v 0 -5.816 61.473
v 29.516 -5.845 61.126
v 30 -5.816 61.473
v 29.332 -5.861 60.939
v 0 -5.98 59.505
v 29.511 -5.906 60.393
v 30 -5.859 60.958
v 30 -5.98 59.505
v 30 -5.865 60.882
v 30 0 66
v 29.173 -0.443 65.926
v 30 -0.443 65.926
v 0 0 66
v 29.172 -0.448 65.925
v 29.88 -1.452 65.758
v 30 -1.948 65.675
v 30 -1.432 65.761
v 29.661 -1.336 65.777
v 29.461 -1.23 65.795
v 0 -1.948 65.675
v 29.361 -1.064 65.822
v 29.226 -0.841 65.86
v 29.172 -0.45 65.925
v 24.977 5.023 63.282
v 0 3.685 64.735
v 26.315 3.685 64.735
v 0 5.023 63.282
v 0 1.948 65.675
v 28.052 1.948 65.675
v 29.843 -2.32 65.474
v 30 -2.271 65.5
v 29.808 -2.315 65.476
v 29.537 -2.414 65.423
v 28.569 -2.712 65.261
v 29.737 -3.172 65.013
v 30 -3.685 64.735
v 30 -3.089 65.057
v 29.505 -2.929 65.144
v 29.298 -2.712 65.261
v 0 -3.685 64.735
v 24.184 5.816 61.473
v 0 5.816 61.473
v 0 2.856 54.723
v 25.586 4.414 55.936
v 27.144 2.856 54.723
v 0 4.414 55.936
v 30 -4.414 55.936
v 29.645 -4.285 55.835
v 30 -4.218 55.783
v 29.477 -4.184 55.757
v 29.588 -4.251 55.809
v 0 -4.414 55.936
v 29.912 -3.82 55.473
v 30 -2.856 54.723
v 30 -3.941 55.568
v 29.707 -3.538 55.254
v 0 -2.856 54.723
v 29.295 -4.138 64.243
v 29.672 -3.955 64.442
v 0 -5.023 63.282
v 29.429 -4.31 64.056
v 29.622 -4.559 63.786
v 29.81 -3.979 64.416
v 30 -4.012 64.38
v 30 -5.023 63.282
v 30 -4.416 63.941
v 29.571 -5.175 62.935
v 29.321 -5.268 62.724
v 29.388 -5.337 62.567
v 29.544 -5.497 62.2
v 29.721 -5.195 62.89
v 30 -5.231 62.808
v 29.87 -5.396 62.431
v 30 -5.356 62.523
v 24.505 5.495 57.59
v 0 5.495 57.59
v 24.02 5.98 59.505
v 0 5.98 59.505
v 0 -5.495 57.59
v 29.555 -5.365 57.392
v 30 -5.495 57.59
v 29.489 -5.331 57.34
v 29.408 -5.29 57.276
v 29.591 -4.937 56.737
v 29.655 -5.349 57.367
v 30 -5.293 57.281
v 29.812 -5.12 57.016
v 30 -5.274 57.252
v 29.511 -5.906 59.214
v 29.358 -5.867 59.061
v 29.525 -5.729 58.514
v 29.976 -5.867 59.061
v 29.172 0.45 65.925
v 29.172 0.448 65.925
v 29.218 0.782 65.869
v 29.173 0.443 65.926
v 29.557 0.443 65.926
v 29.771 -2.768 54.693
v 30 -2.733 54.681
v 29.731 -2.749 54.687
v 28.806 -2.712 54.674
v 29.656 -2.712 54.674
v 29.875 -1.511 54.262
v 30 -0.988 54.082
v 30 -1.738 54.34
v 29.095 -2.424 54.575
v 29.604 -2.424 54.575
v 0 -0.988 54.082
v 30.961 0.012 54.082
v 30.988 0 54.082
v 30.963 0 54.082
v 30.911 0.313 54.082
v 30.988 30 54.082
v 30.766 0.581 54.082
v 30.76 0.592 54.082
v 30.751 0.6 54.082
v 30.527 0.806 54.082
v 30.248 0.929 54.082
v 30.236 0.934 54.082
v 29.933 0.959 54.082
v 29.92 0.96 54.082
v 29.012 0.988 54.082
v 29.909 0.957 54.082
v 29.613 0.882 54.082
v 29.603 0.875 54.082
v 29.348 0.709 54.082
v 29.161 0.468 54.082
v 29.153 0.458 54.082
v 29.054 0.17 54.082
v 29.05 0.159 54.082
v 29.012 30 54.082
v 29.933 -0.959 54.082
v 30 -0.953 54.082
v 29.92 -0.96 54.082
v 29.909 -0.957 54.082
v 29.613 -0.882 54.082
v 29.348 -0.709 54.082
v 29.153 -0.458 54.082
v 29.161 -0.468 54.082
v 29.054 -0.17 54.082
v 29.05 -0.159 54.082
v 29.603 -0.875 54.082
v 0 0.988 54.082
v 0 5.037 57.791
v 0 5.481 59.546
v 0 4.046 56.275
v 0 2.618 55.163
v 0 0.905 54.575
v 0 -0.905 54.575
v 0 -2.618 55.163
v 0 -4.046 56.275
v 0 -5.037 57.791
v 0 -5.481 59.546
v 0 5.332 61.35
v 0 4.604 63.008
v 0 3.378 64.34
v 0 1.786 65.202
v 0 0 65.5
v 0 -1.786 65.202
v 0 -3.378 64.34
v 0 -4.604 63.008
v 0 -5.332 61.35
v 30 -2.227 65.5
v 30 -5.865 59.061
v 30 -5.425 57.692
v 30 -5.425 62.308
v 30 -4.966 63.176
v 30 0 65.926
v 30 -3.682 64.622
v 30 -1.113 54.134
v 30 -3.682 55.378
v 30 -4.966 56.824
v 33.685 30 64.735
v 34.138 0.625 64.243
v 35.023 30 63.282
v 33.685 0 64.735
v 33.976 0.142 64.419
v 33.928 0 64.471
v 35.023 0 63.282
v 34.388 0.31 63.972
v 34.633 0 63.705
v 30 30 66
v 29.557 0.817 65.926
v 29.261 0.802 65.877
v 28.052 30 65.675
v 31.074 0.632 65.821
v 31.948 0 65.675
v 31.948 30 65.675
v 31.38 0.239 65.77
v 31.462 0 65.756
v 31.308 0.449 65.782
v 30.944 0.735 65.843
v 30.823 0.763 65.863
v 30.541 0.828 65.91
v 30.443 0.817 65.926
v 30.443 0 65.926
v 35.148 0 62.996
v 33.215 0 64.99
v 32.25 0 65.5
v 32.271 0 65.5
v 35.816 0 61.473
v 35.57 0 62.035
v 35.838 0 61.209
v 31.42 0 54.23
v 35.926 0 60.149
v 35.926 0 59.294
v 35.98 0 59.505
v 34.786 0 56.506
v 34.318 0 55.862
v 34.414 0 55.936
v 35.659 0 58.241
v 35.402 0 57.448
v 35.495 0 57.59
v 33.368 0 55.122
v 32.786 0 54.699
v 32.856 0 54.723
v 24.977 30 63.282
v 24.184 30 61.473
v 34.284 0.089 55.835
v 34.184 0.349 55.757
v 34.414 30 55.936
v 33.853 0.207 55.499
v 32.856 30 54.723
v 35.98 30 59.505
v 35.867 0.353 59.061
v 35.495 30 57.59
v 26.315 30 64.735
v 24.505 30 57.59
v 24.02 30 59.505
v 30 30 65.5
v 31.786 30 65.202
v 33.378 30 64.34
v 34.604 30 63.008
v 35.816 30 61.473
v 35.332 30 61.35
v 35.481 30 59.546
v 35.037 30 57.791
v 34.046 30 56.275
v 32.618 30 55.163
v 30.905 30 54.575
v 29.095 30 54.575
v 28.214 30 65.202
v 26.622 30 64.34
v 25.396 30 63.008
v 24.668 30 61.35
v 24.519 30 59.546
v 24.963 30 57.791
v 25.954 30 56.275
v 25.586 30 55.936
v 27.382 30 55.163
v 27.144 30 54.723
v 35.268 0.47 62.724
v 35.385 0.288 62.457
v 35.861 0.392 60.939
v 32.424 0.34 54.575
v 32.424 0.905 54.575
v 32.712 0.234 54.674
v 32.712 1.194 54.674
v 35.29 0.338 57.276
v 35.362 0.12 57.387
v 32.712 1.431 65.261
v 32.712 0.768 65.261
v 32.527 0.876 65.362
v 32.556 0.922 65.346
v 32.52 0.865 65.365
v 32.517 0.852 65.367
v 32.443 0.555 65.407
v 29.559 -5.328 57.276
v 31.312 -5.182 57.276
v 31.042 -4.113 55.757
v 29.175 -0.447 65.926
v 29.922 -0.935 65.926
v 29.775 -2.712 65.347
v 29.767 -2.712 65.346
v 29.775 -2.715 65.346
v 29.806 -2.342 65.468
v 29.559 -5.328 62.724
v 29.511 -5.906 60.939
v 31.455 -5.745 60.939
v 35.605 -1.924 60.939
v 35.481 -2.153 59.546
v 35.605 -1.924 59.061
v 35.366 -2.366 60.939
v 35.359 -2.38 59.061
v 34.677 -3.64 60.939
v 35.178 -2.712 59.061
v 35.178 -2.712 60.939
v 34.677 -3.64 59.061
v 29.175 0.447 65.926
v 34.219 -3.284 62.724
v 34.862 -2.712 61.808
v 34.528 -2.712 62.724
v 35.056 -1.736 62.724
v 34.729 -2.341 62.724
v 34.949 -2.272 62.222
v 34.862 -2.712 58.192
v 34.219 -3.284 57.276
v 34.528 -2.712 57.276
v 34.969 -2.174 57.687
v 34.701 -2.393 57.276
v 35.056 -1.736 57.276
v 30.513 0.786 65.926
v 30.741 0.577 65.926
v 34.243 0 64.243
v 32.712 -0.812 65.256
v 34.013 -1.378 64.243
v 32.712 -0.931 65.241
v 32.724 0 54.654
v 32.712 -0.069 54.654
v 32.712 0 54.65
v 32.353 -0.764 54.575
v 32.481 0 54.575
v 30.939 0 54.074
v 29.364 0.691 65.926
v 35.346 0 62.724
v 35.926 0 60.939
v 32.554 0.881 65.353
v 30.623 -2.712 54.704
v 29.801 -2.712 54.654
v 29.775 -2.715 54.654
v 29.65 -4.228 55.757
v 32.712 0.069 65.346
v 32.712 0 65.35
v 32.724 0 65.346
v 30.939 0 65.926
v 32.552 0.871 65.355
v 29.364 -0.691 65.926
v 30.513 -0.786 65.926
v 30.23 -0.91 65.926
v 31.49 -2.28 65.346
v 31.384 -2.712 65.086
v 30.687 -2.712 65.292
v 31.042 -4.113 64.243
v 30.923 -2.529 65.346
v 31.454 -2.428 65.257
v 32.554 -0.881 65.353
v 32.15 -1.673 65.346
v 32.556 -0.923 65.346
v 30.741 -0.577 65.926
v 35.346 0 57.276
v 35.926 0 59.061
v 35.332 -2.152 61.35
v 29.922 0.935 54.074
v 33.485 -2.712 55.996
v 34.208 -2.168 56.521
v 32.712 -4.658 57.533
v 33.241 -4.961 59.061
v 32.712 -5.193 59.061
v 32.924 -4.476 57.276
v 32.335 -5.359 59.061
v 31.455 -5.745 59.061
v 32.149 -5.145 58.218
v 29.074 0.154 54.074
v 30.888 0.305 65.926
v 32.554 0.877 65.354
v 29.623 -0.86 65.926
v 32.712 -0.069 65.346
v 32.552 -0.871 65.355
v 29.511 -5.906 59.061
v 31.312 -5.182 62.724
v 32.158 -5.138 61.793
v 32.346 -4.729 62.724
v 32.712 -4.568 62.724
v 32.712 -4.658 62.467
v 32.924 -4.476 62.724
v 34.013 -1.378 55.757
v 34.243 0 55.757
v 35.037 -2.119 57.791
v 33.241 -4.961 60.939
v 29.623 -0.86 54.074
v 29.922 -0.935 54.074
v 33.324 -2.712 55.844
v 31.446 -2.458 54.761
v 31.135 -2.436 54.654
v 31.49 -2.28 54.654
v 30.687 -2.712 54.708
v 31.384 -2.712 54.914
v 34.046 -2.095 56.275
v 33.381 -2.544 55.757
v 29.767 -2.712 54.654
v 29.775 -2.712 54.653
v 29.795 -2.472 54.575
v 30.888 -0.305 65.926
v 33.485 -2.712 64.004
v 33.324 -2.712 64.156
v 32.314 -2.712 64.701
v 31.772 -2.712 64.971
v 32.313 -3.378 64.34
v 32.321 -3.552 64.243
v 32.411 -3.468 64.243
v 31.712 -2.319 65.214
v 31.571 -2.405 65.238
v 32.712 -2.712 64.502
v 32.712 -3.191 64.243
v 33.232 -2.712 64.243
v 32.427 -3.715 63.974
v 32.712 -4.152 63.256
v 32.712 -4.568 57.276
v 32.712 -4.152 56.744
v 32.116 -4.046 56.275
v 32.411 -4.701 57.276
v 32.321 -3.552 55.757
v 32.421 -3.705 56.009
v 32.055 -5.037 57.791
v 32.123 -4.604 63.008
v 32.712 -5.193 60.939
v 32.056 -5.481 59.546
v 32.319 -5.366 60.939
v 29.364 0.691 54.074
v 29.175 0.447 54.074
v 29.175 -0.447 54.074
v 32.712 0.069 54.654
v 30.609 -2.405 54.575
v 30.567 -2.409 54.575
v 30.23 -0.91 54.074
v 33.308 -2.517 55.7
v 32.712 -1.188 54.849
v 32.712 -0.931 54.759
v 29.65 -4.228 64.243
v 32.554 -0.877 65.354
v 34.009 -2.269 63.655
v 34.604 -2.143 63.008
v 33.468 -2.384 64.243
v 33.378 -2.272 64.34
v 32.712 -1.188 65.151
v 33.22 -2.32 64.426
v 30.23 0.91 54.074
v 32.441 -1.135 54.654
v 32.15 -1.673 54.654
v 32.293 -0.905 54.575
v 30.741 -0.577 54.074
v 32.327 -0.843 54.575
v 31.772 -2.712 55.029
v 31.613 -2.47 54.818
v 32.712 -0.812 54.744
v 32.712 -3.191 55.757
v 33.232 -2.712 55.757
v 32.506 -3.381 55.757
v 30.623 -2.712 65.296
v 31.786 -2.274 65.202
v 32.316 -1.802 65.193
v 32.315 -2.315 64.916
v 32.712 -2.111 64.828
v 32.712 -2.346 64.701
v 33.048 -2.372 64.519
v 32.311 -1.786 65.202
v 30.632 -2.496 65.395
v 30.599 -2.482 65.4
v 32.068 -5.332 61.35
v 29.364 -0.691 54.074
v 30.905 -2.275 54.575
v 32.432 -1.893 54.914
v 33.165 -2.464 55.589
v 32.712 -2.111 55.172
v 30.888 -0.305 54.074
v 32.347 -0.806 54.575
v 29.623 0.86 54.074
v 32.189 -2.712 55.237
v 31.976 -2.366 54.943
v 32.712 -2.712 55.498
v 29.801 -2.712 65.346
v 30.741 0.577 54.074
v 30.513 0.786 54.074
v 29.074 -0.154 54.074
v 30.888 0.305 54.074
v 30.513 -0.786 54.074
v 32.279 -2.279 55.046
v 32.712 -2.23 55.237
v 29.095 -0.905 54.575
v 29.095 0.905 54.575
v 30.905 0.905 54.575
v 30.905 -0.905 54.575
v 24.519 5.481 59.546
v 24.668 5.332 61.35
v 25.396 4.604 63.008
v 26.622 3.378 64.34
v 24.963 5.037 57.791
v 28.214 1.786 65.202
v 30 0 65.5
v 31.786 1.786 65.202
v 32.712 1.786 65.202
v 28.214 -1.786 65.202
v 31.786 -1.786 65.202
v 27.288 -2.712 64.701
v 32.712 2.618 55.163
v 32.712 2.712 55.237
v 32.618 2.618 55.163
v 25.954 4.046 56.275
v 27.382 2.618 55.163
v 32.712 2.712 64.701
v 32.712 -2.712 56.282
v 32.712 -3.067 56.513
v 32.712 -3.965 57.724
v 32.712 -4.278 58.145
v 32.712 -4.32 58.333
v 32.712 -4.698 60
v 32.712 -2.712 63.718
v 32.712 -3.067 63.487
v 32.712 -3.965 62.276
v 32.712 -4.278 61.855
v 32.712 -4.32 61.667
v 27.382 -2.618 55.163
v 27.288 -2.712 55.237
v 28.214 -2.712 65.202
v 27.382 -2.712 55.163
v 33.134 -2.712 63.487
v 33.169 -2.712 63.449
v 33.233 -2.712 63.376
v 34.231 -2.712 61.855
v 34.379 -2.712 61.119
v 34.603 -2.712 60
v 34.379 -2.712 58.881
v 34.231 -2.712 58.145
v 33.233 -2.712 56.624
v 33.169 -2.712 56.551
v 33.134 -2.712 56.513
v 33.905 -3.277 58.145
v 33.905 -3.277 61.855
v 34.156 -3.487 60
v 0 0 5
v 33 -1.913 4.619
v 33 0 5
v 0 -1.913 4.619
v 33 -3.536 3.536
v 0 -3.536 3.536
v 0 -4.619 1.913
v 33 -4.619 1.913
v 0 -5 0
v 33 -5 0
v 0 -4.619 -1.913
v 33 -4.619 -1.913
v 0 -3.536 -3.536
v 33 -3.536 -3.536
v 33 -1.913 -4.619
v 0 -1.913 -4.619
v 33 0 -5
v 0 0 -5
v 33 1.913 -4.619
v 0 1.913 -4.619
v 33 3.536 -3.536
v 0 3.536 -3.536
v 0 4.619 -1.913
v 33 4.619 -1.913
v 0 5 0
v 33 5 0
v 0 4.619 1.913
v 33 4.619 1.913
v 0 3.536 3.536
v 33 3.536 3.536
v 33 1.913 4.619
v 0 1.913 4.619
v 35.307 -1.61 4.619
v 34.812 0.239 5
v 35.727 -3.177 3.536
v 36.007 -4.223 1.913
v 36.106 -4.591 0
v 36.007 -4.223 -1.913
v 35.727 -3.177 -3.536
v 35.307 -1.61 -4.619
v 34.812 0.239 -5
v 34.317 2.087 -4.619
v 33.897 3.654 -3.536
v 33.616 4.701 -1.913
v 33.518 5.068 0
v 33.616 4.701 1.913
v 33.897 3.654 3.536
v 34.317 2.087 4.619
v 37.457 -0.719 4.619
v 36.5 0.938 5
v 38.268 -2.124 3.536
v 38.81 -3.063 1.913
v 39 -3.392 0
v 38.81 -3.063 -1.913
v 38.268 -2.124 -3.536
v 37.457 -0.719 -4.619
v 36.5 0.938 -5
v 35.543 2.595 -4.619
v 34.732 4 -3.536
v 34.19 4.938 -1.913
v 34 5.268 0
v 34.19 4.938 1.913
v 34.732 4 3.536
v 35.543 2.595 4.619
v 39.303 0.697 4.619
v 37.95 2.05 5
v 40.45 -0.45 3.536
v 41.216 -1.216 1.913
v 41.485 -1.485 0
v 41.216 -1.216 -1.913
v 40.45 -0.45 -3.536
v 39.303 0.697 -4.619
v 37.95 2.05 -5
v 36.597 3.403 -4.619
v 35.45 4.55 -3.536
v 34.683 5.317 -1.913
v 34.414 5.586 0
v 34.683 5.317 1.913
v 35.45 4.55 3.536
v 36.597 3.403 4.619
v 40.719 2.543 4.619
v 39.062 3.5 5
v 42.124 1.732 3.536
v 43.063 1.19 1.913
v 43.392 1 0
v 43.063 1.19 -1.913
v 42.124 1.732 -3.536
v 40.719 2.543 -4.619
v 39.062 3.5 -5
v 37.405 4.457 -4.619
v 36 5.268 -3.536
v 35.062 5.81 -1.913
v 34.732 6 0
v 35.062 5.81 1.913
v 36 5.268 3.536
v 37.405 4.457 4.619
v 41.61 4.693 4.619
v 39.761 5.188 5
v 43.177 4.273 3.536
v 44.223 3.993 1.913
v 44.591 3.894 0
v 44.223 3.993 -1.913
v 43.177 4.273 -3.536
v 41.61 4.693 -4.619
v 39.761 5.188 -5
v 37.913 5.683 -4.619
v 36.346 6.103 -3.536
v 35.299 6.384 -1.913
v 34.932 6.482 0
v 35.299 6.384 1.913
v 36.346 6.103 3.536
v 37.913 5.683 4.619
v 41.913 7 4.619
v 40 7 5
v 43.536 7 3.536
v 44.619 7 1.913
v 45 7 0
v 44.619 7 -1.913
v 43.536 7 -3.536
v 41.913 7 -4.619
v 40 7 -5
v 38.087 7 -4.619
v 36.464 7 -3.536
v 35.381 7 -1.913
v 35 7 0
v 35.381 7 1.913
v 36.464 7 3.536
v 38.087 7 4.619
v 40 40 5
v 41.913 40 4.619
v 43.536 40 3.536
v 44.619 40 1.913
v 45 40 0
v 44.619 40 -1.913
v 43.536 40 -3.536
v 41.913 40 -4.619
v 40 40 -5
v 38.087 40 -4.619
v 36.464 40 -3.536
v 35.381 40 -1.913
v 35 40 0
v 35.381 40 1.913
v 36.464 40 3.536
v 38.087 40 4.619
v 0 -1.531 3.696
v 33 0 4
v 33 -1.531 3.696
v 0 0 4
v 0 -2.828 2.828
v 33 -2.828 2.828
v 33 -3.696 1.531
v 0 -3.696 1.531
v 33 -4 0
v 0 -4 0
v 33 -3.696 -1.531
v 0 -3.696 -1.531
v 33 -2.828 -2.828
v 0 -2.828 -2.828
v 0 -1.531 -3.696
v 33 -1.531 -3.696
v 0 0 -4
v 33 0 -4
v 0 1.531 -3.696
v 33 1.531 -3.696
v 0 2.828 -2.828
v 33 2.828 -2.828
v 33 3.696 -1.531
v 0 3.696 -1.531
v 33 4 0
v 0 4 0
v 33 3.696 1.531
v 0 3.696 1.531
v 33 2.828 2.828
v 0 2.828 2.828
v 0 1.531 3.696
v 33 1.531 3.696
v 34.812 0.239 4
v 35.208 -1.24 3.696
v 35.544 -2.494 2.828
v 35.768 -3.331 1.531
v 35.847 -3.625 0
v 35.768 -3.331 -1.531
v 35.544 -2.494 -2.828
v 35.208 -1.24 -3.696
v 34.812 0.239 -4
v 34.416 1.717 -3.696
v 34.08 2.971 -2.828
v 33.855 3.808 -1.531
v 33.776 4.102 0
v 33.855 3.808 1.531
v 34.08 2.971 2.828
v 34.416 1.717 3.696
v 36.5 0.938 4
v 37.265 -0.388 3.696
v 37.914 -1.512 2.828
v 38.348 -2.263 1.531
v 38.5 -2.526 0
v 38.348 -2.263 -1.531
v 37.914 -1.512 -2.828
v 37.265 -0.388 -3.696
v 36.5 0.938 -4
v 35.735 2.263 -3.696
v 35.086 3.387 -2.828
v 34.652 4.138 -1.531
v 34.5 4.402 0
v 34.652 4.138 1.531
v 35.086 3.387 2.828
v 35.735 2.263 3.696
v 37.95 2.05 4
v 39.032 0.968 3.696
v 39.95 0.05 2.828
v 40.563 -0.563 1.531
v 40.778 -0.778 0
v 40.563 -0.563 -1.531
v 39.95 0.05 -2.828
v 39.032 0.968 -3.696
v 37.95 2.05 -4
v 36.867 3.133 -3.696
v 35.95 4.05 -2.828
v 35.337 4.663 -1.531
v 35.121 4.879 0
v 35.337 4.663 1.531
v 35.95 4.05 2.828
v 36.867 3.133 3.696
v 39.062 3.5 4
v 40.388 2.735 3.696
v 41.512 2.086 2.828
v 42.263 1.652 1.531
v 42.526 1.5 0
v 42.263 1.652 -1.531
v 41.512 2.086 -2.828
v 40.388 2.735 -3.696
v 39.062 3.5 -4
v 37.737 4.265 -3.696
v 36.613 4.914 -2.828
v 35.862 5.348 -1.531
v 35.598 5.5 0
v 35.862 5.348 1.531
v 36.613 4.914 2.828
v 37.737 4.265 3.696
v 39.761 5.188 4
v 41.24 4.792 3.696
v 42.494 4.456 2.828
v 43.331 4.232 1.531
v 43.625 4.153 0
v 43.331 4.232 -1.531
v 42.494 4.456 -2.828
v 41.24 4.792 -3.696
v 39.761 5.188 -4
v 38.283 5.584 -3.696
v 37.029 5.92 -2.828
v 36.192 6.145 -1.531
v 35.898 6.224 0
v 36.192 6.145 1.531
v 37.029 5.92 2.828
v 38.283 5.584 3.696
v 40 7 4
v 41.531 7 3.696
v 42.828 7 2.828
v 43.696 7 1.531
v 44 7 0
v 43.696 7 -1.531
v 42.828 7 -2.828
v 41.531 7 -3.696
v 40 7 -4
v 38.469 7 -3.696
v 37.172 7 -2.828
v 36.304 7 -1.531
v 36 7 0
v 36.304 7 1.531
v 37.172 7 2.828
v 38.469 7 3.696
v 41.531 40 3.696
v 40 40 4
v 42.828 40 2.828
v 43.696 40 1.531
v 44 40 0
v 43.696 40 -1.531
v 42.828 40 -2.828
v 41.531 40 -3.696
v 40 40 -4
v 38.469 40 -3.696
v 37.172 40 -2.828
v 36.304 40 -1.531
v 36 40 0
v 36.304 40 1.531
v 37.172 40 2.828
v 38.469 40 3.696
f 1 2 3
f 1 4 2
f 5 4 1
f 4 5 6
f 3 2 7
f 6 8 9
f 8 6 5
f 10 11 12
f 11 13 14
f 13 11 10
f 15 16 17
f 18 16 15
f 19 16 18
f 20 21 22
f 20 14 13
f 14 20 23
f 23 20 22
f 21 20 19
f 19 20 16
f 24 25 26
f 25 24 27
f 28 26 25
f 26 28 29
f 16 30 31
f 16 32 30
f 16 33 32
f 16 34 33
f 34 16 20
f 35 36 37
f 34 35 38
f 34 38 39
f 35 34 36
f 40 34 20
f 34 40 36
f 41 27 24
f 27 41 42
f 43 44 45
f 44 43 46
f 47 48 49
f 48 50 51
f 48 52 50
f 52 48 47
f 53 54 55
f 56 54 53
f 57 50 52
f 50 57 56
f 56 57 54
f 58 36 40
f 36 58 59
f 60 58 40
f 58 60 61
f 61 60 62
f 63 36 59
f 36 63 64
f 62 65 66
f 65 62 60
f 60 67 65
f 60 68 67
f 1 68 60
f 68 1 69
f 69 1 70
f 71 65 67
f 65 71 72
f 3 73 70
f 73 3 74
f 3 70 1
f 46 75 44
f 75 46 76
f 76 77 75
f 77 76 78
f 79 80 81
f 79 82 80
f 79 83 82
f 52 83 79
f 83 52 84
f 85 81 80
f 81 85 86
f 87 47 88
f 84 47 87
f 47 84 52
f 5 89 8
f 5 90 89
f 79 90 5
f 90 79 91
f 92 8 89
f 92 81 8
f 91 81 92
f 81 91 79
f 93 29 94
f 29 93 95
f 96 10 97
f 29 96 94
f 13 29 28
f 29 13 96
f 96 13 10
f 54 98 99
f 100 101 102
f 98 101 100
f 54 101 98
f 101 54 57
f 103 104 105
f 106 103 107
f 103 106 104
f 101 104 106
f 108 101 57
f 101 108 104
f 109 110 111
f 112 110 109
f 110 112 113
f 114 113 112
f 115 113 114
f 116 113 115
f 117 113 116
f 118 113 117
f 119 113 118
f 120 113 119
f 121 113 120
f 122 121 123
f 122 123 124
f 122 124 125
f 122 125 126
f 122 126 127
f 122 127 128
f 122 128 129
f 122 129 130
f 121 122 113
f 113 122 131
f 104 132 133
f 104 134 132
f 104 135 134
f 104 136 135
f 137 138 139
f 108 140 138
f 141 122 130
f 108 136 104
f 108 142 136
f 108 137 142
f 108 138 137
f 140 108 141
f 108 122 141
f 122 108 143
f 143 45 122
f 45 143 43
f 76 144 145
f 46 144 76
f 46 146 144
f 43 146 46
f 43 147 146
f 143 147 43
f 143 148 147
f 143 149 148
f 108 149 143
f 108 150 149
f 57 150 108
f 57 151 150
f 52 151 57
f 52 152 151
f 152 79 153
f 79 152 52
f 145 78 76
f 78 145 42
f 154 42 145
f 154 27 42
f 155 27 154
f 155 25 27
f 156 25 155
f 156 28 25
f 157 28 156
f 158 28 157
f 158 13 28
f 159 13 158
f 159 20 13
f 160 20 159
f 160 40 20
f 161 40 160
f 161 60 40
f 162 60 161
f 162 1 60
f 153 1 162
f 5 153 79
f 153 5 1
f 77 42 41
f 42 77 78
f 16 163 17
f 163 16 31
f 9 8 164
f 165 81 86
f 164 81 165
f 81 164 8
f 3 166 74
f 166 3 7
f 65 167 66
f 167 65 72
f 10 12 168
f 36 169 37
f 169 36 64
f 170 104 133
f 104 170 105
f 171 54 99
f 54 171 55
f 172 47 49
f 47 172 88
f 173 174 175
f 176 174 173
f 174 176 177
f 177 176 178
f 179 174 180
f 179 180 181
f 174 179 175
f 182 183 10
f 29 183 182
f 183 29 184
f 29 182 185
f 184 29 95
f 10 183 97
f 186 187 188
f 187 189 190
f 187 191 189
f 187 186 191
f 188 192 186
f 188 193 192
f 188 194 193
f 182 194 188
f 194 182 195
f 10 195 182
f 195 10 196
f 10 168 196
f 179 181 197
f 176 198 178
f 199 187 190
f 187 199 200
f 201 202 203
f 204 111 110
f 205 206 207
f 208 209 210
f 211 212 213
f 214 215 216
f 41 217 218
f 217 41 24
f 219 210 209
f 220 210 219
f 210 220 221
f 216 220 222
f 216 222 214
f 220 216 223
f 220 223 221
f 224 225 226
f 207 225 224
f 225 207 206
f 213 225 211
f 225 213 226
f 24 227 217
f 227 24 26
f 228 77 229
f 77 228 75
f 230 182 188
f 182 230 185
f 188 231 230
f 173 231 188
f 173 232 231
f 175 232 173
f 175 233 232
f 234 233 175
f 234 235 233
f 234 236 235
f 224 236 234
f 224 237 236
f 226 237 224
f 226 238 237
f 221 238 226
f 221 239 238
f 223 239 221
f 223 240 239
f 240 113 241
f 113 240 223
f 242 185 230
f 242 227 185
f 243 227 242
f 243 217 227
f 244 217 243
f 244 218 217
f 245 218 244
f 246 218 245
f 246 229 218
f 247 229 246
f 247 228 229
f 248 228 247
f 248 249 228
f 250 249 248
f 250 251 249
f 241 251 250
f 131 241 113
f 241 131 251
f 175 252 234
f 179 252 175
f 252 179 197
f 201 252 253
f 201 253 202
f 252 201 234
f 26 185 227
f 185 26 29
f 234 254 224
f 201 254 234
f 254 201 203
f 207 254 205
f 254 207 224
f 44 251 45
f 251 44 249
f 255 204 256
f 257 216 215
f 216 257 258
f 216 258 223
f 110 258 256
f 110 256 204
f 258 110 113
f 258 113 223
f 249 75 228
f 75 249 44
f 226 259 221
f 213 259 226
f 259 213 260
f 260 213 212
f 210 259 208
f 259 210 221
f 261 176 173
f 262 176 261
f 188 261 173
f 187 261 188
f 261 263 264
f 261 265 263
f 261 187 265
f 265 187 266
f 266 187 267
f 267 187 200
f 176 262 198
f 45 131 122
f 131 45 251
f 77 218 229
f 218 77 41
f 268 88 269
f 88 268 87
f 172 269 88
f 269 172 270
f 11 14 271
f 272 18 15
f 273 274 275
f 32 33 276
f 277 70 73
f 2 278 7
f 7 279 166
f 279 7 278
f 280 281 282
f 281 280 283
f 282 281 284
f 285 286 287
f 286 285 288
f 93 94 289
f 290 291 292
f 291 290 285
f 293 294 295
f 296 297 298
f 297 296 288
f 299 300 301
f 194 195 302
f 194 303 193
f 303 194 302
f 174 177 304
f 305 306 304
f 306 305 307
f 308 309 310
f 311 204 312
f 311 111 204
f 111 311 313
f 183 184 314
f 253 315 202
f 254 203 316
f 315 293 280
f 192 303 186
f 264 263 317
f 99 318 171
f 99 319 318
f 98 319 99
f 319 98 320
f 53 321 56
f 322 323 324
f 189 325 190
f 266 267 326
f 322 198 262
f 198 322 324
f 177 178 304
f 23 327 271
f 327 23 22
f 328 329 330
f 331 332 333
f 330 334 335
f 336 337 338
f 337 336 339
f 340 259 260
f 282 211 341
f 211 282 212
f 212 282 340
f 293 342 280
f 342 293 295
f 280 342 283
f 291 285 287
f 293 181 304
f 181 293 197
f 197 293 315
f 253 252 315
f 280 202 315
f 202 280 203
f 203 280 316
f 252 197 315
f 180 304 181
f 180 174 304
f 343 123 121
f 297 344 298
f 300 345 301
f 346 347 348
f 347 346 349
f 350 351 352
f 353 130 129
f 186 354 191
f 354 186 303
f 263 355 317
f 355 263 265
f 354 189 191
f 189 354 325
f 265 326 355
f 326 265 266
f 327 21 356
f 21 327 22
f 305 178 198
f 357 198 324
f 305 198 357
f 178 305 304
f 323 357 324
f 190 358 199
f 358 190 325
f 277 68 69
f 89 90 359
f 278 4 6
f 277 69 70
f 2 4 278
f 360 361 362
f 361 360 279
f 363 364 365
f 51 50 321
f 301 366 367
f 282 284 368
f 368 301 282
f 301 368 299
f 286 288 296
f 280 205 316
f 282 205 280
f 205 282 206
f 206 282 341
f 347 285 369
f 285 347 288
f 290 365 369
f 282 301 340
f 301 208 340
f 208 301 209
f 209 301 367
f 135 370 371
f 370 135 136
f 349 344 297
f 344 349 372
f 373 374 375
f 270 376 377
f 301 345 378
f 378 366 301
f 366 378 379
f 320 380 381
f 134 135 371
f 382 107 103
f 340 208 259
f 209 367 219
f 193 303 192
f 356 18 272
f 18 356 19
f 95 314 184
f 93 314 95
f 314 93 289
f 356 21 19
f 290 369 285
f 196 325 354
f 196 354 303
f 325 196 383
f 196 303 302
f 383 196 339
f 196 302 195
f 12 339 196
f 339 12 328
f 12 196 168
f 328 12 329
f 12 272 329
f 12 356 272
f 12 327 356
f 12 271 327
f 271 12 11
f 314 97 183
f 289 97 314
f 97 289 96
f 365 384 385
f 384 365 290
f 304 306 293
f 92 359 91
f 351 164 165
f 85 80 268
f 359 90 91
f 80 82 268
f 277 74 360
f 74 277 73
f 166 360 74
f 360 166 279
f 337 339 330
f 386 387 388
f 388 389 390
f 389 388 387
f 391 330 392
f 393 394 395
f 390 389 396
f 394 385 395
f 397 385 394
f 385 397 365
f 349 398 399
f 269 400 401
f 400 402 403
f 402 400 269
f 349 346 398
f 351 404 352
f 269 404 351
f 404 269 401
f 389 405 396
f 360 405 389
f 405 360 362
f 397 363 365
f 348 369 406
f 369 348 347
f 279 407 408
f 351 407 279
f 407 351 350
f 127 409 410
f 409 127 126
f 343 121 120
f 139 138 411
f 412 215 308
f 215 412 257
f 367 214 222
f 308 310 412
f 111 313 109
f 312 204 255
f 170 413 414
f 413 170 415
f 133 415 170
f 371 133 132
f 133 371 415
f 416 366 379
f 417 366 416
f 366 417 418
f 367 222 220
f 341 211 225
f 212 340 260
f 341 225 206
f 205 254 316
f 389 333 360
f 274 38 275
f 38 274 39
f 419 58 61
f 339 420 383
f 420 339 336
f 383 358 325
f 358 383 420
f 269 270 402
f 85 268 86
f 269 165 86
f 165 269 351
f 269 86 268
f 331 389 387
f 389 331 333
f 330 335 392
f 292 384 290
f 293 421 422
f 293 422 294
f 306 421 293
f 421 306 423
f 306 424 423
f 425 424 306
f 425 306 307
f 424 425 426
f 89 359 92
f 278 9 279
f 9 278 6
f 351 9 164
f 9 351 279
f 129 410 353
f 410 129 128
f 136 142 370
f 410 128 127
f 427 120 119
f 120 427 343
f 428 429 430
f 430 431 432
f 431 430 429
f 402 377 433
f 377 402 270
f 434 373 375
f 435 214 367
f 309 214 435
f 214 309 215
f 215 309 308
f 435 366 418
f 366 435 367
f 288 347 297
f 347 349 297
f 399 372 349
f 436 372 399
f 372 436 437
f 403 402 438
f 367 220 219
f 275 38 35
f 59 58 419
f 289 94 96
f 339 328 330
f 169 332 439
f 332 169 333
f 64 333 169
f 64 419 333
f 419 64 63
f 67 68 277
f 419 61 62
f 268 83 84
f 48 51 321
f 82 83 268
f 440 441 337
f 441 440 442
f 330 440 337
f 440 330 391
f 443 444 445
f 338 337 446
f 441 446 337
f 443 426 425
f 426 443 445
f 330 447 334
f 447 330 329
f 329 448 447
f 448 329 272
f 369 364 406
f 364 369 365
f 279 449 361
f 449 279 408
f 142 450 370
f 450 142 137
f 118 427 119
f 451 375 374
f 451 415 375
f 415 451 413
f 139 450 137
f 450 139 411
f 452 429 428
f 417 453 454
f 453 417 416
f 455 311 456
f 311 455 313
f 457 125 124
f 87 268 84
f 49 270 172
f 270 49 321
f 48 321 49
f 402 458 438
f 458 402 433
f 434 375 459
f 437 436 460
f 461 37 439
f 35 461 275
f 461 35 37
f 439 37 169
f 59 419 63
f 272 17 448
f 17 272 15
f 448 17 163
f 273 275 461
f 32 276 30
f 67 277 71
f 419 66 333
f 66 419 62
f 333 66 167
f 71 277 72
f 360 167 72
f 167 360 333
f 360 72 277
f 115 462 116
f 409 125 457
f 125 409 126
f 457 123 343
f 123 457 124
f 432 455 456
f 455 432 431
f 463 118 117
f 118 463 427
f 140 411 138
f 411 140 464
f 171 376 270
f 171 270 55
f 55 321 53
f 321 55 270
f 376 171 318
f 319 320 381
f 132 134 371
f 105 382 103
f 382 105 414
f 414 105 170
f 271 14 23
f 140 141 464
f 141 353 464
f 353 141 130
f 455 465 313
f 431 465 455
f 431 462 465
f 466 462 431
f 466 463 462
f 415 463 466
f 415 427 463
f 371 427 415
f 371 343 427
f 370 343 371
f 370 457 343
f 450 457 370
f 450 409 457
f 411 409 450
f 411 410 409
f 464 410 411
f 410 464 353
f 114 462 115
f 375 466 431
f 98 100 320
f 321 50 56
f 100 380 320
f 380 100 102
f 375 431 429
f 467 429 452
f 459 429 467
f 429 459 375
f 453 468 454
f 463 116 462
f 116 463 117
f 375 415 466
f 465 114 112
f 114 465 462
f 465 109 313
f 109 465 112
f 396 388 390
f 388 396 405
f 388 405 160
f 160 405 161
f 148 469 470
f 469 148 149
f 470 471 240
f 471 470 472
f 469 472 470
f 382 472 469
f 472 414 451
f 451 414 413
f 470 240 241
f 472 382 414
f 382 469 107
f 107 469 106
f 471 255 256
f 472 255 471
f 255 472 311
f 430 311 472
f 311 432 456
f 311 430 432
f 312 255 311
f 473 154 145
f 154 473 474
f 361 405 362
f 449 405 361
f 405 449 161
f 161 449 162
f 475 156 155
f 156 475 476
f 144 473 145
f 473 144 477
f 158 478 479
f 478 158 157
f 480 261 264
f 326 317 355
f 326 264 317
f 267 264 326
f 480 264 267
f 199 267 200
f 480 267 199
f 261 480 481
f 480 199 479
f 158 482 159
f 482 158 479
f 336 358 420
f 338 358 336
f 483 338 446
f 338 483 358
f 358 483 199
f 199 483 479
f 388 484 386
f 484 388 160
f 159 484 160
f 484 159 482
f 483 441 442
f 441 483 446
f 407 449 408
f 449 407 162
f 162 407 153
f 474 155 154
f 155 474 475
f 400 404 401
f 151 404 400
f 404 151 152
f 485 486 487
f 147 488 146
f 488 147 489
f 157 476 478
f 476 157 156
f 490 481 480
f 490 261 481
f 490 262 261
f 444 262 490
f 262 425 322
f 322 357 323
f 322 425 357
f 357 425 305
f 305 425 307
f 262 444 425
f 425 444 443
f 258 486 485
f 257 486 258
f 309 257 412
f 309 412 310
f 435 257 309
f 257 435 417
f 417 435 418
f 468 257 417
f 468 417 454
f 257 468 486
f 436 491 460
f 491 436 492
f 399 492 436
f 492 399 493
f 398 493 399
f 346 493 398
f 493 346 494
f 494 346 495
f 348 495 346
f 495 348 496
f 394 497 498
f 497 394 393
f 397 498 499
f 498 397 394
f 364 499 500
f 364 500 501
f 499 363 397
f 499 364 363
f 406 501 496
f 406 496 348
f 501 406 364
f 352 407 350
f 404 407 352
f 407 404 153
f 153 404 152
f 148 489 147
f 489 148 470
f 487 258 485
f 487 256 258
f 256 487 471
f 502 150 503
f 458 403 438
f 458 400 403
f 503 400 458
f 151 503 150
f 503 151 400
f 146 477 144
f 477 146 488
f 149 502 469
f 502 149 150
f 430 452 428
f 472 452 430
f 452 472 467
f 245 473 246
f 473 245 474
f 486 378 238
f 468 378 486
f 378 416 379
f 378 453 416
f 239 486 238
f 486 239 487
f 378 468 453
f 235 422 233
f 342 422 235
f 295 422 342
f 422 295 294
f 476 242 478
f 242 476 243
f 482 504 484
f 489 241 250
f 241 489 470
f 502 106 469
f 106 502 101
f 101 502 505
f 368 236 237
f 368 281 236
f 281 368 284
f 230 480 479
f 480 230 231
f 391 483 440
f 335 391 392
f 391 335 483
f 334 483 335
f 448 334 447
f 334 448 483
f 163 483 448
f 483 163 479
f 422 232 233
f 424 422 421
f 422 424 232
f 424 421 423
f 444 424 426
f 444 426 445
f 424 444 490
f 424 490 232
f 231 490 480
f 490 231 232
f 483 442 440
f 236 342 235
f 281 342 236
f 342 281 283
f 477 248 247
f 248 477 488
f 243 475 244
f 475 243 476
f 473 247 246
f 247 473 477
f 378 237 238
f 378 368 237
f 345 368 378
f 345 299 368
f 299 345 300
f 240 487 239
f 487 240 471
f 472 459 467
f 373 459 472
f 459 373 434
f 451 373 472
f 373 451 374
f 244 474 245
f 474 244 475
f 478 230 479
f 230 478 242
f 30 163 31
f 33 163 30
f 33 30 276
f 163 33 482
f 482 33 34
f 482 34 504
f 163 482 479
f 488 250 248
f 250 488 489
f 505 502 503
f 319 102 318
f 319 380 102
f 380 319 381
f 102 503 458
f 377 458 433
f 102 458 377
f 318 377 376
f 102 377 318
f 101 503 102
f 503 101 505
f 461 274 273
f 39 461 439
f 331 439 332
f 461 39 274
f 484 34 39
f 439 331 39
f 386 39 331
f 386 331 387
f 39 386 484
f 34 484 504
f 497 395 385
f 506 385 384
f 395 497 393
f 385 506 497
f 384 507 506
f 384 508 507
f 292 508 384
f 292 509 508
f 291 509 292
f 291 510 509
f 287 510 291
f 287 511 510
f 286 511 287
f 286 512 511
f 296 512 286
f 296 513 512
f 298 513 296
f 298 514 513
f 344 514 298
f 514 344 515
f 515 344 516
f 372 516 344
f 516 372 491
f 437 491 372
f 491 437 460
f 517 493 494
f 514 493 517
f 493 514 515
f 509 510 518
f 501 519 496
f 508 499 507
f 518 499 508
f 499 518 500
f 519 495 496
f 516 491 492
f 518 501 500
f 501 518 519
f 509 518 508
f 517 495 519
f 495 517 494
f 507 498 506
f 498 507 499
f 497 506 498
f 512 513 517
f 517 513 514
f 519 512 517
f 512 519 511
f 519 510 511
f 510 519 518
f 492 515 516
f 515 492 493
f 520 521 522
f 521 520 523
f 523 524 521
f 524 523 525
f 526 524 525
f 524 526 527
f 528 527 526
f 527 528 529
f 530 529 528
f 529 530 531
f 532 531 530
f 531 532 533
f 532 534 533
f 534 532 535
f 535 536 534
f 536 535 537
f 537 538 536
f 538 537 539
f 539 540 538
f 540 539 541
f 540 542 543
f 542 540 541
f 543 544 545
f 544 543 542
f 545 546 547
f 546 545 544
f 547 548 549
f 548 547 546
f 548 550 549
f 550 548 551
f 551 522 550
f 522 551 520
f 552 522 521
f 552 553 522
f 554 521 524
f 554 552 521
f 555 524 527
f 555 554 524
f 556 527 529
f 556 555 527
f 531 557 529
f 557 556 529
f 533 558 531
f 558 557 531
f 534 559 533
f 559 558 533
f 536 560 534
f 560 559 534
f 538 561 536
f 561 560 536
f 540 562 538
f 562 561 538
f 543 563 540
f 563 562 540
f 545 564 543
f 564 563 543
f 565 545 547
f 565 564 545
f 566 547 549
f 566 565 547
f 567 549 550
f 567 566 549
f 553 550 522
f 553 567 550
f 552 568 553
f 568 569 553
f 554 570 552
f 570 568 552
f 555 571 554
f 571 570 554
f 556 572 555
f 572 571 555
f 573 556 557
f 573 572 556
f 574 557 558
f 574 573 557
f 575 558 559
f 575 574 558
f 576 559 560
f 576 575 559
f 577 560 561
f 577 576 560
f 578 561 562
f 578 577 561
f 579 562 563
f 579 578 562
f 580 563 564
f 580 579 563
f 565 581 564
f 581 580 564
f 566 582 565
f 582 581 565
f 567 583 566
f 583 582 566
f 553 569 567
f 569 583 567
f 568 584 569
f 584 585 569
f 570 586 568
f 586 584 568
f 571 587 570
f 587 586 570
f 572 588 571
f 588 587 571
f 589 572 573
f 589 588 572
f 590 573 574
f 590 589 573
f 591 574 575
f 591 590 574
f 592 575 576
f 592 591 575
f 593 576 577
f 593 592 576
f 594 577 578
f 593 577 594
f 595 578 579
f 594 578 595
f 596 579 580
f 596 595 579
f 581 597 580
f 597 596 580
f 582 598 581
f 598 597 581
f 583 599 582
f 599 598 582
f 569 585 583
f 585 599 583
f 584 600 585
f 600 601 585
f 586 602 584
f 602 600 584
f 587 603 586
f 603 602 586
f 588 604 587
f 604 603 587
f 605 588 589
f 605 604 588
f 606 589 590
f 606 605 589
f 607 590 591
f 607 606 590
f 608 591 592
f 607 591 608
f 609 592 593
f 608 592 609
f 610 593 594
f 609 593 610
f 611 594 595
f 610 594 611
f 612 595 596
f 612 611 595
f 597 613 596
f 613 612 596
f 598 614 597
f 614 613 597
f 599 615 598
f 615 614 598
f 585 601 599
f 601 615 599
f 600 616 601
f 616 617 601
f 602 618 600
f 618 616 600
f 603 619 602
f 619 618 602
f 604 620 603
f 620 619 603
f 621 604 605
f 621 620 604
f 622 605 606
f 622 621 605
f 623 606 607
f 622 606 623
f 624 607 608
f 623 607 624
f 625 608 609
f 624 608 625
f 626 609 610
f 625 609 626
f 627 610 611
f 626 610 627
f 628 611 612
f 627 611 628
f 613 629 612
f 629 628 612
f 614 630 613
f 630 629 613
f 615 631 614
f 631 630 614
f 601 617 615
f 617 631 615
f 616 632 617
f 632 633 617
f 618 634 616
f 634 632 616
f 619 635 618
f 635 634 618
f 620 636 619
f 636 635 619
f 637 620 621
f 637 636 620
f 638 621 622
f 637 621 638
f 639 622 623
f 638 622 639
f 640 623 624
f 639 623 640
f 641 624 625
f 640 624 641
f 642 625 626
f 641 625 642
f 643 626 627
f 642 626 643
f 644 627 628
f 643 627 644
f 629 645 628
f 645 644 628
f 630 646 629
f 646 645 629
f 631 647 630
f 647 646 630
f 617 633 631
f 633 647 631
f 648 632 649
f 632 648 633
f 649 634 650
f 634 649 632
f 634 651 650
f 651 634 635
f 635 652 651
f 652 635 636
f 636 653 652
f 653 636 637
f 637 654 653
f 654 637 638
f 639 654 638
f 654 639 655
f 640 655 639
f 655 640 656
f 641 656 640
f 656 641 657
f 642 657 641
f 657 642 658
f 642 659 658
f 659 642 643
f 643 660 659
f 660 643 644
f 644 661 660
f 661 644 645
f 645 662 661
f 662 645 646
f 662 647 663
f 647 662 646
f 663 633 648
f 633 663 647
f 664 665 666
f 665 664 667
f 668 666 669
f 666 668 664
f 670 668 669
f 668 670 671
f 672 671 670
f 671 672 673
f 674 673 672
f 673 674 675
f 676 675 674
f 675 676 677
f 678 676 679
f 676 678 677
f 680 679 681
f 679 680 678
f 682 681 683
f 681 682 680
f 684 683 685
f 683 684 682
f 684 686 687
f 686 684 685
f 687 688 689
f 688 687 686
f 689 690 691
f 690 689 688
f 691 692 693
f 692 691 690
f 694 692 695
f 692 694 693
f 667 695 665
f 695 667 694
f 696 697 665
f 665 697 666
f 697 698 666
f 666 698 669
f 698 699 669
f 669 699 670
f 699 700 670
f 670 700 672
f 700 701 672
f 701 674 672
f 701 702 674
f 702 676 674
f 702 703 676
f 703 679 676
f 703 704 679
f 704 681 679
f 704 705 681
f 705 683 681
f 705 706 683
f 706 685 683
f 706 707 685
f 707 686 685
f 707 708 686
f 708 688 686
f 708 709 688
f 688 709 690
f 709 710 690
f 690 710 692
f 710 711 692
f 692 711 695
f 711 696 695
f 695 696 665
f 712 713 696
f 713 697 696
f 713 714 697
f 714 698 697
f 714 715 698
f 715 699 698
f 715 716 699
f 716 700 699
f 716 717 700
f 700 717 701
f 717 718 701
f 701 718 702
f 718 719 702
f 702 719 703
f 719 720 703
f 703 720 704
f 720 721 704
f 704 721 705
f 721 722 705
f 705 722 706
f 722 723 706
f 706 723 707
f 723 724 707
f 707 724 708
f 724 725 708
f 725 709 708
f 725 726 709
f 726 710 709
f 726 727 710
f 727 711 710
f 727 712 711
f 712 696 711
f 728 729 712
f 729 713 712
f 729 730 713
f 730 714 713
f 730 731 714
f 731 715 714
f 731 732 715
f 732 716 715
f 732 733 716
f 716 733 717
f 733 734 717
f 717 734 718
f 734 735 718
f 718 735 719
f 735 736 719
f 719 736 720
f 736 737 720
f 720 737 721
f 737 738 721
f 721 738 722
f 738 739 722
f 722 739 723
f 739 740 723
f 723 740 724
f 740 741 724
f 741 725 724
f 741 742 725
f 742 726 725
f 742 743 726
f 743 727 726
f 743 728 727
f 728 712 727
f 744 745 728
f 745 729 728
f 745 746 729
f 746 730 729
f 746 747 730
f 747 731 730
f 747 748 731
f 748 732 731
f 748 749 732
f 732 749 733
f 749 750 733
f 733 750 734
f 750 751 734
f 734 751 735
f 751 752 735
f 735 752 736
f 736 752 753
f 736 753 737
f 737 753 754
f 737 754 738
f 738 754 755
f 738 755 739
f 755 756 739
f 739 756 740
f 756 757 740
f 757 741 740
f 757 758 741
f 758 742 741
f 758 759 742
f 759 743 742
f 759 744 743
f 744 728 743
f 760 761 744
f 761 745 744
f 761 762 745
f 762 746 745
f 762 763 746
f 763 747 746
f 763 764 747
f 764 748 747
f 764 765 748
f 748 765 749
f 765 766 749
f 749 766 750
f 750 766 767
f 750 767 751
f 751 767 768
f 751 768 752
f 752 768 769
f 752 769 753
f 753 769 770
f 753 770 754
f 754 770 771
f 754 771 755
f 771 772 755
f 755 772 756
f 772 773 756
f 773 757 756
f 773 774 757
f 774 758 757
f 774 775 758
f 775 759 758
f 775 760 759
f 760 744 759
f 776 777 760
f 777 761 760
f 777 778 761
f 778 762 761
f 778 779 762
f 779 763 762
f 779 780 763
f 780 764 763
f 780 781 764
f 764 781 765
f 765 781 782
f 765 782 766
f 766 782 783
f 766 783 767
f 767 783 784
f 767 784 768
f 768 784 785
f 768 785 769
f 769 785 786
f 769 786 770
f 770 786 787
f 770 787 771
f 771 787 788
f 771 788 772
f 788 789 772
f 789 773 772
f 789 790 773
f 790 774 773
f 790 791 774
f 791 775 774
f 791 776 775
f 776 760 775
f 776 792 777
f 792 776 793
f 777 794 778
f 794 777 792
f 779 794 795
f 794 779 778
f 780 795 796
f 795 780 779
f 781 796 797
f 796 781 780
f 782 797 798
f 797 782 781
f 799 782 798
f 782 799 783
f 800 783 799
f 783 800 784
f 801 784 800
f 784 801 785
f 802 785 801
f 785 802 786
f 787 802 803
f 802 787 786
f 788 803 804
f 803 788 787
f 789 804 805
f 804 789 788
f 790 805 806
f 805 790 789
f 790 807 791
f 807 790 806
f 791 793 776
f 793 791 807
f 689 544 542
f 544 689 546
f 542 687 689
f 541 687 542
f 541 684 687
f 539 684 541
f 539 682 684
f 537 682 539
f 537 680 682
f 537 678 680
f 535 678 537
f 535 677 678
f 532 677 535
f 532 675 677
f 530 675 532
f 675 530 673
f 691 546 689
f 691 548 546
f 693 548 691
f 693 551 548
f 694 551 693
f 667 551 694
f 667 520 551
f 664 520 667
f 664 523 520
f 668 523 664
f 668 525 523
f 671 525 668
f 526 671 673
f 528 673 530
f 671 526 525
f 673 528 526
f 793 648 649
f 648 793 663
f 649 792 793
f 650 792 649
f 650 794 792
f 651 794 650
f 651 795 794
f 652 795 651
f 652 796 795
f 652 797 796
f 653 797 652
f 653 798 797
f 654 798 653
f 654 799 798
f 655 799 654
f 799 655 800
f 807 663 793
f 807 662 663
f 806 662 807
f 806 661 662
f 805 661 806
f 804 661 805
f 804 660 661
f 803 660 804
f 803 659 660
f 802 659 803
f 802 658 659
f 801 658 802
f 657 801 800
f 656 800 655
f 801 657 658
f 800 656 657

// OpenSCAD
// Provokes EVERY advisory warning the library can emit, so that silencing one
// is caught. This cannot live in tests/guards/: a guard must ABORT, and these
// are echo() calls that deliberately do not.
//
// --hardwarnings does NOT promote them -- they are ECHO: lines, not WARNING:
// lines -- so a green `just check` is NOT evidence that no uniTube warning was
// emitted. `just warnings` is what checks these, by asserting each one appears.

use <../../src/uniTube.scad>;

$fa = 12;
$fs = 2;

// CHECK-2 — a bend tighter than one full od. Legal, but tight to print.
// CHECK-3 — a wall below ut_min_wall(). Renders perfectly, prints as a hole.
ut_tube(ut_polyline([[0, 0, 0], [40, 0, 0], [40, 40, 0]], r=7), ut_round(od=10, id=8));

// NET-4 — a joint ball whose own wall is below the minimum.
translate([0, 0, 60]) {
    prof = ut_round(od=12, id=11); // 0.5 mm wall
    a = ut_run("a", ut_polyline([[0, 0, 0], [30, 0, 0]]), prof);
    b = ut_run("b", ut_polyline([[30, 0, 0], [30, 30, 0]]), prof);
    ut_assemble(ut_net([a, b], [ut_joint([["a", "b"], ["b", "a"]])]));
}
